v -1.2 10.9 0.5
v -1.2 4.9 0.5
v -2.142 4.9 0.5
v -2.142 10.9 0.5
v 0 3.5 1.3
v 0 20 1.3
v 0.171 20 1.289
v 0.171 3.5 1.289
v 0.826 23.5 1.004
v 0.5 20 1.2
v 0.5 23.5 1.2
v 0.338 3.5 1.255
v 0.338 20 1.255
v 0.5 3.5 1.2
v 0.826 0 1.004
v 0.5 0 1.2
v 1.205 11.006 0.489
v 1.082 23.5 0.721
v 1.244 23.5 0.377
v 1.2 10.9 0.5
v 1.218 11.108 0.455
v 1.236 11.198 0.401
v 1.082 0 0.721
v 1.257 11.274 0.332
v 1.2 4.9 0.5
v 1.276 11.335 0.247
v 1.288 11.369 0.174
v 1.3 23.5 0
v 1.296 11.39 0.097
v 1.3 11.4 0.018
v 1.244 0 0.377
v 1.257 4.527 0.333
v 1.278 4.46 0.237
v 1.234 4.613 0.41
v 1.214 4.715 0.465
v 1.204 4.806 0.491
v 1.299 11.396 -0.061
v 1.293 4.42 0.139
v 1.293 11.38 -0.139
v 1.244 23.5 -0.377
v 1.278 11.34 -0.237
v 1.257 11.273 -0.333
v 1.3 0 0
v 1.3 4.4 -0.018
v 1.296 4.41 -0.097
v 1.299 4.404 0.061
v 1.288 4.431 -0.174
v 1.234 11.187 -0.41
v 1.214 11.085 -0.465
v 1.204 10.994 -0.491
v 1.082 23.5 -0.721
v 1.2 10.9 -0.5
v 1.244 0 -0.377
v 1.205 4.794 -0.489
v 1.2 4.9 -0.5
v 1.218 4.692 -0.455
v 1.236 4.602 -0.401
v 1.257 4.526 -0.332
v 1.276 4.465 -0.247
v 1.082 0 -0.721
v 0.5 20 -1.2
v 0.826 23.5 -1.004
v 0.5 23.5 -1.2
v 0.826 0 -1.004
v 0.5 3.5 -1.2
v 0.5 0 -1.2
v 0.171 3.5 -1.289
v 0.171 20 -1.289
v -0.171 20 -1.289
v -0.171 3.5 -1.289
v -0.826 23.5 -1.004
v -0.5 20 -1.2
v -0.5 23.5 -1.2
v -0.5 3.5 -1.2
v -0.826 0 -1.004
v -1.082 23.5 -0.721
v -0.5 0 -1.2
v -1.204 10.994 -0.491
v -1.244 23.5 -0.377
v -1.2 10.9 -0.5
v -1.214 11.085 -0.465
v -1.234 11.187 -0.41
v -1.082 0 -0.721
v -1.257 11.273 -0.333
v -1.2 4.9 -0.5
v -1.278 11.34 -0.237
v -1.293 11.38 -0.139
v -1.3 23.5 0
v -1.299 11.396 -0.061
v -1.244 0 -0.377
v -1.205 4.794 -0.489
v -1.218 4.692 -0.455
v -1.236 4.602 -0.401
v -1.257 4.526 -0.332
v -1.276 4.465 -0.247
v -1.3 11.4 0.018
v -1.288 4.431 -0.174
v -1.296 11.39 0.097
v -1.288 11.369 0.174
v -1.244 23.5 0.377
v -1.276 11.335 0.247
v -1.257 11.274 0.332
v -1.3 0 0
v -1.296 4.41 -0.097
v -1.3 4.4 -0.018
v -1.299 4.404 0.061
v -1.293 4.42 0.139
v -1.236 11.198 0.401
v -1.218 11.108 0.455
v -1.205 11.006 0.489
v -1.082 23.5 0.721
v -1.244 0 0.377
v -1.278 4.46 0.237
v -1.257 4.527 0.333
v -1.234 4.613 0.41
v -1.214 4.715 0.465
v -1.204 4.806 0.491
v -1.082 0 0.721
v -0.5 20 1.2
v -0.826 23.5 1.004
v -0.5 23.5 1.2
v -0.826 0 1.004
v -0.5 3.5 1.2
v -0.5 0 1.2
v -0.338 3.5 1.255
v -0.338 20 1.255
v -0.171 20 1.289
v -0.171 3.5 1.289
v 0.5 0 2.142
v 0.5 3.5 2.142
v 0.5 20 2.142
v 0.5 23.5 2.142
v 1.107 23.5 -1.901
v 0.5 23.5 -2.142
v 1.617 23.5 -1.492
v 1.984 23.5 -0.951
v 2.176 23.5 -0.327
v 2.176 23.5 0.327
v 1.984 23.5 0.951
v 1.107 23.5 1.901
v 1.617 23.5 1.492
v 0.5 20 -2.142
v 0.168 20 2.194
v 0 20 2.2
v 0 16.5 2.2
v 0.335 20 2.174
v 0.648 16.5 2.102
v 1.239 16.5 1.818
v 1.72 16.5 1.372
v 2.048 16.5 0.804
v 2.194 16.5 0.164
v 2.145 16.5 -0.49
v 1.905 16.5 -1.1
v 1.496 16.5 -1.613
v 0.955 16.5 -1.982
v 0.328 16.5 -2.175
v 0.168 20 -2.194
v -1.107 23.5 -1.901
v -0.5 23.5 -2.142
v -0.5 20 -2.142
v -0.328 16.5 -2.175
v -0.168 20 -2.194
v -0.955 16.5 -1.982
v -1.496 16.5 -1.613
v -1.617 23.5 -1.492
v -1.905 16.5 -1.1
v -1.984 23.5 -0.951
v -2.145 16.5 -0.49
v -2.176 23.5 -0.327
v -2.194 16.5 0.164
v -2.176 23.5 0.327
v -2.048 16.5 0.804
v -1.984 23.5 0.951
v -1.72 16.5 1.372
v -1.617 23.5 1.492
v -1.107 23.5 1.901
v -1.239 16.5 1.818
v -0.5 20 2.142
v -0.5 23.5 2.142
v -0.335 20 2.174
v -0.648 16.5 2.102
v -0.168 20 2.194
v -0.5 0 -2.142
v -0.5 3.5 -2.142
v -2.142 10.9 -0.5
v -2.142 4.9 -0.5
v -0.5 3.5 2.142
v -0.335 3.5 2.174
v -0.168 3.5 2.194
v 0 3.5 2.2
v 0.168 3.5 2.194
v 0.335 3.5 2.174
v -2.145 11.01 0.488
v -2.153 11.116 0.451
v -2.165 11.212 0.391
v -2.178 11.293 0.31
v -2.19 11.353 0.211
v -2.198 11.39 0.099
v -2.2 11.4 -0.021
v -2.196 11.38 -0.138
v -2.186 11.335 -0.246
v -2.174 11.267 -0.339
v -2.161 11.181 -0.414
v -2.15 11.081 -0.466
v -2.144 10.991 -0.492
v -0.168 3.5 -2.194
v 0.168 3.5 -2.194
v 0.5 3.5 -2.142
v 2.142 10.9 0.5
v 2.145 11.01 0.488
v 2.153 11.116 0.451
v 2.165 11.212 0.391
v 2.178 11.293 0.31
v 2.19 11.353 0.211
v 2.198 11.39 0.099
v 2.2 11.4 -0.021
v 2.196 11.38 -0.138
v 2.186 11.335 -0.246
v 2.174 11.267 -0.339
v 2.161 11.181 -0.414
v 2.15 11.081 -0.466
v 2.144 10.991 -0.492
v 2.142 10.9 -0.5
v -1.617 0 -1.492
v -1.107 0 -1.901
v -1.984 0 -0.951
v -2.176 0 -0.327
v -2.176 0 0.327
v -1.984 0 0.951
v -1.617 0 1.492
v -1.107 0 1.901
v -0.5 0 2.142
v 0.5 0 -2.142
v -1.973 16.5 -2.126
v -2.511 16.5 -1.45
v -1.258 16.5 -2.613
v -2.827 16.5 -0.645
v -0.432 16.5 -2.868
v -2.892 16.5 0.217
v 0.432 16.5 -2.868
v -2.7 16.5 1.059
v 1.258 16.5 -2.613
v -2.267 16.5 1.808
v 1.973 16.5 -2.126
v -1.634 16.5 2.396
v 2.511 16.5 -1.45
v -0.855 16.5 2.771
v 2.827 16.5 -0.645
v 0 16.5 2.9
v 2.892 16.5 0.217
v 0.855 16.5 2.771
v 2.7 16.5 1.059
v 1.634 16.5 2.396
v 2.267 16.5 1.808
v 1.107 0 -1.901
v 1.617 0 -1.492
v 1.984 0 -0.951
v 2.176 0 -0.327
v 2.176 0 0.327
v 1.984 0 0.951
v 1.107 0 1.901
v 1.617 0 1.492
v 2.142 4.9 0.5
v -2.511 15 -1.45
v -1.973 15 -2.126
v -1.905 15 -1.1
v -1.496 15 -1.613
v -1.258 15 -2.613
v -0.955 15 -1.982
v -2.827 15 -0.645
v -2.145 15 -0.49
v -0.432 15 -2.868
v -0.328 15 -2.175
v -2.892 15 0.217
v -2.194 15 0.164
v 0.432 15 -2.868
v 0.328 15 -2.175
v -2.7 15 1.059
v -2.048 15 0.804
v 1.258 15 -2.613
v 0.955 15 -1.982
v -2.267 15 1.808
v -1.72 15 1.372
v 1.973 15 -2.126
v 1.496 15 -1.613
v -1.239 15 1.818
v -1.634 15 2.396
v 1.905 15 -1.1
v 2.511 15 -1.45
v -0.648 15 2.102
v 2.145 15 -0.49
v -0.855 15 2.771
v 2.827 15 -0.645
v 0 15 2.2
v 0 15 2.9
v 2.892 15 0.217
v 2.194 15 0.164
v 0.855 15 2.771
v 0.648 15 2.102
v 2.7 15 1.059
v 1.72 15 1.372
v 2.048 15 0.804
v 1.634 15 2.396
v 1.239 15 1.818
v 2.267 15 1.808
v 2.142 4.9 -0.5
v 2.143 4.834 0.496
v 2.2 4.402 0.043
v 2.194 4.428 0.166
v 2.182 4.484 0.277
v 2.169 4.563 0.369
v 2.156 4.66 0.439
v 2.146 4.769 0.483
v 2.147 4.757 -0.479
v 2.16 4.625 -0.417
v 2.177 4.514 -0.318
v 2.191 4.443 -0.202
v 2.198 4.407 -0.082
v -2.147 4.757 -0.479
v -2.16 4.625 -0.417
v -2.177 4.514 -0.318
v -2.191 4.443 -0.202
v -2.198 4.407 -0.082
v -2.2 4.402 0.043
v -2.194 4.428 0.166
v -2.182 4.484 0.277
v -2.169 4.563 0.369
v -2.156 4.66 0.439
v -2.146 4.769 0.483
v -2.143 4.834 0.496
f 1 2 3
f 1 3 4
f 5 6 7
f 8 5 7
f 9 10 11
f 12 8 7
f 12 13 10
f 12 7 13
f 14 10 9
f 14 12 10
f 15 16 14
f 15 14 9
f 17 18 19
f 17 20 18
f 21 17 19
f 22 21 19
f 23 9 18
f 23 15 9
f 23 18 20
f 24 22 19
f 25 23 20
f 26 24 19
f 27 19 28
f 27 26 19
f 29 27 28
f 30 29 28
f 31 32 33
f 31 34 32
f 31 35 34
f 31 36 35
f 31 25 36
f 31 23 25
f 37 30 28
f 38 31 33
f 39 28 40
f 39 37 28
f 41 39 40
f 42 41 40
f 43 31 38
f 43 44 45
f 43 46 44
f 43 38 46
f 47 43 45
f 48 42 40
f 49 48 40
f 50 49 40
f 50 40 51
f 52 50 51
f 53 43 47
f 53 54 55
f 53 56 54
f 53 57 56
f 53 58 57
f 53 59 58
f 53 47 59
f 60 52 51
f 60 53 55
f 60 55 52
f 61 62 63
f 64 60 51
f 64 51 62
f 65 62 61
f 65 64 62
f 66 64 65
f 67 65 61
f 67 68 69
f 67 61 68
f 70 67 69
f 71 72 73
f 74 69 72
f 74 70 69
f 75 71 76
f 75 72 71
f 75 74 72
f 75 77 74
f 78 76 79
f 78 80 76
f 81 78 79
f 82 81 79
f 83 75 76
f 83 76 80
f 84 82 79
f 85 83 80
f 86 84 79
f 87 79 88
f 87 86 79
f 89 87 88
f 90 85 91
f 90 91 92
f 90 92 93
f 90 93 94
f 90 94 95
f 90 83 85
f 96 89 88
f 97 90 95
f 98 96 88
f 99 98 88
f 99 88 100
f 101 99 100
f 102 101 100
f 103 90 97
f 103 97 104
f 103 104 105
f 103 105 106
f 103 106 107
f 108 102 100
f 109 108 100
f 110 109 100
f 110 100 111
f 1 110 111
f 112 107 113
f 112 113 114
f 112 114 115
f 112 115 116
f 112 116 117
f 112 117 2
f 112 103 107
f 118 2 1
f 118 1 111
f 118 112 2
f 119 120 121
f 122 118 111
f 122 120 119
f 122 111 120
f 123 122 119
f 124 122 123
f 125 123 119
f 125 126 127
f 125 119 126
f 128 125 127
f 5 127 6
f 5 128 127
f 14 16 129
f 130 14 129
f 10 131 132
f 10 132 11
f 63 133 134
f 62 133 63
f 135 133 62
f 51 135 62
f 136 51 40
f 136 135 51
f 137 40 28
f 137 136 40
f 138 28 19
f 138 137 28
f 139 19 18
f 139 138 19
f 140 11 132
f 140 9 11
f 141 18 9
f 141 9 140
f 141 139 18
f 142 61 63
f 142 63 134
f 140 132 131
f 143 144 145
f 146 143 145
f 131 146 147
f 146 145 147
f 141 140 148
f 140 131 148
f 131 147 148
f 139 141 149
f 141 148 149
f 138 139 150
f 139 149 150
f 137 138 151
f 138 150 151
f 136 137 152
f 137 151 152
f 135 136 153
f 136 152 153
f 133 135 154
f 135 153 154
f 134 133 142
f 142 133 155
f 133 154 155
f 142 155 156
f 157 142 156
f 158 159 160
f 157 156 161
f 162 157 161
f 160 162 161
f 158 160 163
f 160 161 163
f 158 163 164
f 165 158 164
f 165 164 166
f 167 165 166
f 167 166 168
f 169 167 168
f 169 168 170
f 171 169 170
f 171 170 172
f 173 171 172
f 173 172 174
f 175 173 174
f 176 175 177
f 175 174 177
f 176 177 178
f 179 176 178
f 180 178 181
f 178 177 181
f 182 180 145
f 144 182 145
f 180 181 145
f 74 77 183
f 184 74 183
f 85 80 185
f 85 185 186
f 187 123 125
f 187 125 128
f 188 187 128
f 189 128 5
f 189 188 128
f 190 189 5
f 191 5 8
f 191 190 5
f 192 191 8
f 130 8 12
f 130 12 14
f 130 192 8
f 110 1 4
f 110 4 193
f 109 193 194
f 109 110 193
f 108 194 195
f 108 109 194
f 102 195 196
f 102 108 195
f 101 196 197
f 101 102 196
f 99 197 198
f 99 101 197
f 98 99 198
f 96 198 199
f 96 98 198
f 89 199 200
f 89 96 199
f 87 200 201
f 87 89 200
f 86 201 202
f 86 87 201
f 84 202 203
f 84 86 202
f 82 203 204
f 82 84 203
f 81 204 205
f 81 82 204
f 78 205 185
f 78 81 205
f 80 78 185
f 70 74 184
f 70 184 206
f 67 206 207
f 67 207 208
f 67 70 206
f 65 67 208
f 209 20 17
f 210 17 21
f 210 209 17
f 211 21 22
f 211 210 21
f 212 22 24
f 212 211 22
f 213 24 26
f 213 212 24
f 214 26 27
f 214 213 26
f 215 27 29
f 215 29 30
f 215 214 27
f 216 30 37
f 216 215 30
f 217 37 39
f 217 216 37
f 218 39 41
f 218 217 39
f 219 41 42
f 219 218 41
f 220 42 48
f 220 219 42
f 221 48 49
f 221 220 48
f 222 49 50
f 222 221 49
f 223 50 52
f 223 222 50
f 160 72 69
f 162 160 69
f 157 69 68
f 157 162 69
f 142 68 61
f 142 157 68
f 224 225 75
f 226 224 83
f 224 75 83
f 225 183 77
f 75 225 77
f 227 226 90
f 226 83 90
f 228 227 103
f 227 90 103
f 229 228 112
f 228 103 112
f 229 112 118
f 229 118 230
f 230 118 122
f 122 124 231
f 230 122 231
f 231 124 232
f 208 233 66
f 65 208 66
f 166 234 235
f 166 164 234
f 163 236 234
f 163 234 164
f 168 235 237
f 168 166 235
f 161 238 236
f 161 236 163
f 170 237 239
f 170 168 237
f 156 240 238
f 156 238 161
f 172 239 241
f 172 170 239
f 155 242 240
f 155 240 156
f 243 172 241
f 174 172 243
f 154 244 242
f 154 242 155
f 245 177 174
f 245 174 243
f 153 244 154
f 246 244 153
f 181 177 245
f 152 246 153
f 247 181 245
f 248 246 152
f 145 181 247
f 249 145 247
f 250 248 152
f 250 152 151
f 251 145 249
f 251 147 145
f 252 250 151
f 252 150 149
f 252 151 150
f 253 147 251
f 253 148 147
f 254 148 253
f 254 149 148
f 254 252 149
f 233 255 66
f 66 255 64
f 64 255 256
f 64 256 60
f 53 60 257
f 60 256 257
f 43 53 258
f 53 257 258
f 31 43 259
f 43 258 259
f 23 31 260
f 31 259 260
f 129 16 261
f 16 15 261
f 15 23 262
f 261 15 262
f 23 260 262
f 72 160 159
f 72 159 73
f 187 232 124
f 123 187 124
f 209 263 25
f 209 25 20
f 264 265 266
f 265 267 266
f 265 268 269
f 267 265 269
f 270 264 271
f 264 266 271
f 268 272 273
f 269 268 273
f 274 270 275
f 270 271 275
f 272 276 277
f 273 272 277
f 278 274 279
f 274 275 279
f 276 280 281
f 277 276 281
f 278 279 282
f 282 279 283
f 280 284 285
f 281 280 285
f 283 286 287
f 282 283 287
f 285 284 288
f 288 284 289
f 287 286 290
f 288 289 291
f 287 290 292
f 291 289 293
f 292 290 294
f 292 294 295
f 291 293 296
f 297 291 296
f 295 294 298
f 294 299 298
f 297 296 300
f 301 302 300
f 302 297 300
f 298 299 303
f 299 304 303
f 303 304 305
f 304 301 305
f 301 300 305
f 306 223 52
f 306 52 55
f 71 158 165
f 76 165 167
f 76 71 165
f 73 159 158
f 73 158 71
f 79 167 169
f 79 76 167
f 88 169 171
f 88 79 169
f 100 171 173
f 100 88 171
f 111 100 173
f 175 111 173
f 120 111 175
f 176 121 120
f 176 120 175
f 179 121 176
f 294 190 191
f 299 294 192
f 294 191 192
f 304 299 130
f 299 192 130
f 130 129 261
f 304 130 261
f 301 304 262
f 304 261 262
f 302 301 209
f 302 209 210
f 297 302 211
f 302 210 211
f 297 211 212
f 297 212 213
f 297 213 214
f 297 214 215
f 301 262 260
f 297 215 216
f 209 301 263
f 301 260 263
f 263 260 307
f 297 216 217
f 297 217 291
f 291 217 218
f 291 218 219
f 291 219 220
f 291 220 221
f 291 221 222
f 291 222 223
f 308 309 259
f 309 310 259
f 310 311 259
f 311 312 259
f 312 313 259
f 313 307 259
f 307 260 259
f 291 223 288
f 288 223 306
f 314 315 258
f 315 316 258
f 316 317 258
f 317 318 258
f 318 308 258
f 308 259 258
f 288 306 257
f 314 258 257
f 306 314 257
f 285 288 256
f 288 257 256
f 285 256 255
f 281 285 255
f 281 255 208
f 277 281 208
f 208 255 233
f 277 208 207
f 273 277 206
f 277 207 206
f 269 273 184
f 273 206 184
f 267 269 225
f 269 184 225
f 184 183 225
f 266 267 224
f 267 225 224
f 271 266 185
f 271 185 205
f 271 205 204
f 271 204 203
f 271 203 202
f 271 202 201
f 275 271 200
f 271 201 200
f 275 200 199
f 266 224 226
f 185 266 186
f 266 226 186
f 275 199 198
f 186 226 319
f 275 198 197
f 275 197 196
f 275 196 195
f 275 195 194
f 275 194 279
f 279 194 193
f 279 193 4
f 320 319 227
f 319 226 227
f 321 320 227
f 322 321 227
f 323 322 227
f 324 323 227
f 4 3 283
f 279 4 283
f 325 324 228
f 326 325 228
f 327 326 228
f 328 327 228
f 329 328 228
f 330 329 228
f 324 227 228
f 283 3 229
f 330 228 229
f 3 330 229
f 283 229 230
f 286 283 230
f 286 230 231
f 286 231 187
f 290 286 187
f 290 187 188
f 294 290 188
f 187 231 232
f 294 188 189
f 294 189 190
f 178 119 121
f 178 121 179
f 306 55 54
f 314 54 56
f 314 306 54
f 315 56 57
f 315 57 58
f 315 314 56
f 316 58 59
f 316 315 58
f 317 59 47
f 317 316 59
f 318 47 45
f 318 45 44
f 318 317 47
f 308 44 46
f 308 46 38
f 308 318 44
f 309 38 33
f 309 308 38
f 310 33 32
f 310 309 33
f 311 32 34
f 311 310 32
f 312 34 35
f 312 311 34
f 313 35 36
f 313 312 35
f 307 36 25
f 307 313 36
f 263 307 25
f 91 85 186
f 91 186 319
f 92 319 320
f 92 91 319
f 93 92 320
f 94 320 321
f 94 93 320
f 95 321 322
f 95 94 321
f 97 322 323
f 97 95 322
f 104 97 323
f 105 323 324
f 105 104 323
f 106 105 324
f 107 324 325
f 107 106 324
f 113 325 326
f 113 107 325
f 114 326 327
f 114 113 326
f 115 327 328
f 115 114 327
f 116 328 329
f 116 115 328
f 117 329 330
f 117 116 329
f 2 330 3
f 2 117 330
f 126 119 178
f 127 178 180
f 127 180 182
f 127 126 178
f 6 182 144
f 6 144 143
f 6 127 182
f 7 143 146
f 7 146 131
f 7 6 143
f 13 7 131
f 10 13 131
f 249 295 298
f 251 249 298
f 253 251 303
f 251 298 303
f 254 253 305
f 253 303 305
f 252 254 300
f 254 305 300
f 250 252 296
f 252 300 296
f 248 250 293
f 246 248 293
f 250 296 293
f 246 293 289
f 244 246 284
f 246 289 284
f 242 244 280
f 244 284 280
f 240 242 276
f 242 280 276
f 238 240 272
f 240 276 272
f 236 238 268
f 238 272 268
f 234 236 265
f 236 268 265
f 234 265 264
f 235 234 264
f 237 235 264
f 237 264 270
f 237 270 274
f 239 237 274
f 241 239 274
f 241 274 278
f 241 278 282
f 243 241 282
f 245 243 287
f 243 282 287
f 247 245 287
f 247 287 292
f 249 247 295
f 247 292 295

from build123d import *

# Parameters (mm, degrees)
SKETCH1_R           = 2.2
SKETCH1_R_2         = 1.3
BOSS_EXTRUDE1_DEPTH = 23.5
BOSS_EXTRUDE2_START = -1.5
SKETCH2_R           = 2.9
SKETCH2_R_2         = 2.2
BOSS_EXTRUDE2_DEPTH = 1.5
CUT_EXTRUDE1_START  = -3.5
CUT_EXTRUDE1_DEPTH  = 3.5
CUT_EXTRUDE2_DEPTH  = 3.5
CUT_EXTRUDE3_DEPTH  = 11.75


with BuildPart() as part:
    # Sketch1 → Boss-Extrude1 (new body)
    with BuildSketch(Plane(origin=(0, 0, 0), x_dir=(1, 0, 0), z_dir=(0, 1, 0))):
        with Locations(Location((0, 0, 0), (0, 0, 270))):
            Circle(SKETCH1_R)
        with Locations(Location((0, 0, 0), (0, 0, 270))):
            Circle(SKETCH1_R_2, mode=Mode.SUBTRACT)
    extrude(amount=BOSS_EXTRUDE1_DEPTH)

    # Sketch2 → Boss-Extrude2 (add)
    with BuildSketch(Plane(origin=(0, 16.5, 0), x_dir=(1, 0, 0), z_dir=(0, 1, 0)).offset(BOSS_EXTRUDE2_START)):
        with Locations(Location((0, 0, 0), (0, 0, 270))):
            Circle(SKETCH2_R)
        with Locations(Location((0, 0, 0), (0, 0, 270))):
            Circle(SKETCH2_R_2, mode=Mode.SUBTRACT)
    extrude(amount=BOSS_EXTRUDE2_DEPTH)

    # Sketch4 → Cut-Extrude1 (cut)
    with BuildSketch(Plane(origin=(0, 23.5, 0), x_dir=(1, 0, 0), z_dir=(0, 1, 0)).offset(CUT_EXTRUDE1_START)):
        with BuildLine():
            Line((-0.5, -1.2), (-0.5, -2.142428529))
            ThreePointArc((-0.5, -2.142428529), (0, -2.2), (0.5, -2.142428529))
            Line((0.5, -2.142428529), (0.5, -1.2))
            ThreePointArc((0.5, -1.2), (0, -1.3), (-0.5, -1.2))
        make_face()
        with BuildLine():
            ThreePointArc((0.5, 2.142428529), (0, 2.2), (-0.5, 2.142428529))
            Line((-0.5, 2.142428529), (-0.5, 1.2))
            ThreePointArc((-0.5, 1.2), (0, 1.3), (0.5, 1.2))
            Line((0.5, 1.2), (0.5, 2.142428529))
        make_face()
        with BuildLine():
            Line((-0.5, -1.2), (-0.5, -2.142428529))
            ThreePointArc((-0.5, -2.142428529), (0, -2.2), (0.5, -2.142428529))
            Line((0.5, -2.142428529), (0.5, -1.2))
            ThreePointArc((0.5, -1.2), (0, -1.3), (-0.5, -1.2))
        make_face()
        with BuildLine():
            ThreePointArc((0.5, 2.142428529), (0, 2.2), (-0.5, 2.142428529))
            Line((-0.5, 2.142428529), (-0.5, 1.2))
            ThreePointArc((-0.5, 1.2), (0, 1.3), (0.5, 1.2))
            Line((0.5, 1.2), (0.5, 2.142428529))
        make_face()
    extrude(amount=CUT_EXTRUDE1_DEPTH, mode=Mode.SUBTRACT)

    # Sketch5 → Cut-Extrude2 (cut)
    with BuildSketch(Plane.XZ):
        with BuildLine():
            ThreePointArc((0.5, 2.142428529), (0, 2.2), (-0.5, 2.142428529))
            Line((-0.5, 2.142428529), (-0.5, 1.2))
            ThreePointArc((-0.5, 1.2), (0, 1.3), (0.5, 1.2))
            Line((0.5, 1.2), (0.5, 2.142428529))
        make_face()
        with BuildLine():
            Line((-0.5, -1.2), (-0.5, -2.142428529))
            ThreePointArc((-0.5, -2.142428529), (0, -2.2), (0.5, -2.142428529))
            Line((0.5, -2.142428529), (0.5, -1.2))
            ThreePointArc((0.5, -1.2), (0, -1.3), (-0.5, -1.2))
        make_face()
        with BuildLine():
            ThreePointArc((0.5, 2.142428529), (0, 2.2), (-0.5, 2.142428529))
            Line((-0.5, 2.142428529), (-0.5, 1.2))
            ThreePointArc((-0.5, 1.2), (0, 1.3), (0.5, 1.2))
            Line((0.5, 1.2), (0.5, 2.142428529))
        make_face()
        with BuildLine():
            Line((-0.5, -1.2), (-0.5, -2.142428529))
            ThreePointArc((-0.5, -2.142428529), (0, -2.2), (0.5, -2.142428529))
            Line((0.5, -2.142428529), (0.5, -1.2))
            ThreePointArc((0.5, -1.2), (0, -1.3), (-0.5, -1.2))
        make_face()
    extrude(amount=-CUT_EXTRUDE2_DEPTH, mode=Mode.SUBTRACT)

    # Sketch6 → Cut-Extrude3 (cut, symmetric)
    with BuildSketch(Plane(origin=(0, 0, 0), x_dir=(0, 0, -1), z_dir=(1, 0, 0))):
        with BuildLine():
            Line((0.5, 10.9), (0.5, 4.9))
            ThreePointArc((0.5, 4.9), (0, 4.4), (-0.5, 4.9))
            Line((-0.5, 4.9), (-0.5, 10.9))
            ThreePointArc((-0.5, 10.9), (0, 11.4), (0.5, 10.9))
        make_face()
    extrude(amount=CUT_EXTRUDE3_DEPTH, both=True, mode=Mode.SUBTRACT)


solid = part.part
